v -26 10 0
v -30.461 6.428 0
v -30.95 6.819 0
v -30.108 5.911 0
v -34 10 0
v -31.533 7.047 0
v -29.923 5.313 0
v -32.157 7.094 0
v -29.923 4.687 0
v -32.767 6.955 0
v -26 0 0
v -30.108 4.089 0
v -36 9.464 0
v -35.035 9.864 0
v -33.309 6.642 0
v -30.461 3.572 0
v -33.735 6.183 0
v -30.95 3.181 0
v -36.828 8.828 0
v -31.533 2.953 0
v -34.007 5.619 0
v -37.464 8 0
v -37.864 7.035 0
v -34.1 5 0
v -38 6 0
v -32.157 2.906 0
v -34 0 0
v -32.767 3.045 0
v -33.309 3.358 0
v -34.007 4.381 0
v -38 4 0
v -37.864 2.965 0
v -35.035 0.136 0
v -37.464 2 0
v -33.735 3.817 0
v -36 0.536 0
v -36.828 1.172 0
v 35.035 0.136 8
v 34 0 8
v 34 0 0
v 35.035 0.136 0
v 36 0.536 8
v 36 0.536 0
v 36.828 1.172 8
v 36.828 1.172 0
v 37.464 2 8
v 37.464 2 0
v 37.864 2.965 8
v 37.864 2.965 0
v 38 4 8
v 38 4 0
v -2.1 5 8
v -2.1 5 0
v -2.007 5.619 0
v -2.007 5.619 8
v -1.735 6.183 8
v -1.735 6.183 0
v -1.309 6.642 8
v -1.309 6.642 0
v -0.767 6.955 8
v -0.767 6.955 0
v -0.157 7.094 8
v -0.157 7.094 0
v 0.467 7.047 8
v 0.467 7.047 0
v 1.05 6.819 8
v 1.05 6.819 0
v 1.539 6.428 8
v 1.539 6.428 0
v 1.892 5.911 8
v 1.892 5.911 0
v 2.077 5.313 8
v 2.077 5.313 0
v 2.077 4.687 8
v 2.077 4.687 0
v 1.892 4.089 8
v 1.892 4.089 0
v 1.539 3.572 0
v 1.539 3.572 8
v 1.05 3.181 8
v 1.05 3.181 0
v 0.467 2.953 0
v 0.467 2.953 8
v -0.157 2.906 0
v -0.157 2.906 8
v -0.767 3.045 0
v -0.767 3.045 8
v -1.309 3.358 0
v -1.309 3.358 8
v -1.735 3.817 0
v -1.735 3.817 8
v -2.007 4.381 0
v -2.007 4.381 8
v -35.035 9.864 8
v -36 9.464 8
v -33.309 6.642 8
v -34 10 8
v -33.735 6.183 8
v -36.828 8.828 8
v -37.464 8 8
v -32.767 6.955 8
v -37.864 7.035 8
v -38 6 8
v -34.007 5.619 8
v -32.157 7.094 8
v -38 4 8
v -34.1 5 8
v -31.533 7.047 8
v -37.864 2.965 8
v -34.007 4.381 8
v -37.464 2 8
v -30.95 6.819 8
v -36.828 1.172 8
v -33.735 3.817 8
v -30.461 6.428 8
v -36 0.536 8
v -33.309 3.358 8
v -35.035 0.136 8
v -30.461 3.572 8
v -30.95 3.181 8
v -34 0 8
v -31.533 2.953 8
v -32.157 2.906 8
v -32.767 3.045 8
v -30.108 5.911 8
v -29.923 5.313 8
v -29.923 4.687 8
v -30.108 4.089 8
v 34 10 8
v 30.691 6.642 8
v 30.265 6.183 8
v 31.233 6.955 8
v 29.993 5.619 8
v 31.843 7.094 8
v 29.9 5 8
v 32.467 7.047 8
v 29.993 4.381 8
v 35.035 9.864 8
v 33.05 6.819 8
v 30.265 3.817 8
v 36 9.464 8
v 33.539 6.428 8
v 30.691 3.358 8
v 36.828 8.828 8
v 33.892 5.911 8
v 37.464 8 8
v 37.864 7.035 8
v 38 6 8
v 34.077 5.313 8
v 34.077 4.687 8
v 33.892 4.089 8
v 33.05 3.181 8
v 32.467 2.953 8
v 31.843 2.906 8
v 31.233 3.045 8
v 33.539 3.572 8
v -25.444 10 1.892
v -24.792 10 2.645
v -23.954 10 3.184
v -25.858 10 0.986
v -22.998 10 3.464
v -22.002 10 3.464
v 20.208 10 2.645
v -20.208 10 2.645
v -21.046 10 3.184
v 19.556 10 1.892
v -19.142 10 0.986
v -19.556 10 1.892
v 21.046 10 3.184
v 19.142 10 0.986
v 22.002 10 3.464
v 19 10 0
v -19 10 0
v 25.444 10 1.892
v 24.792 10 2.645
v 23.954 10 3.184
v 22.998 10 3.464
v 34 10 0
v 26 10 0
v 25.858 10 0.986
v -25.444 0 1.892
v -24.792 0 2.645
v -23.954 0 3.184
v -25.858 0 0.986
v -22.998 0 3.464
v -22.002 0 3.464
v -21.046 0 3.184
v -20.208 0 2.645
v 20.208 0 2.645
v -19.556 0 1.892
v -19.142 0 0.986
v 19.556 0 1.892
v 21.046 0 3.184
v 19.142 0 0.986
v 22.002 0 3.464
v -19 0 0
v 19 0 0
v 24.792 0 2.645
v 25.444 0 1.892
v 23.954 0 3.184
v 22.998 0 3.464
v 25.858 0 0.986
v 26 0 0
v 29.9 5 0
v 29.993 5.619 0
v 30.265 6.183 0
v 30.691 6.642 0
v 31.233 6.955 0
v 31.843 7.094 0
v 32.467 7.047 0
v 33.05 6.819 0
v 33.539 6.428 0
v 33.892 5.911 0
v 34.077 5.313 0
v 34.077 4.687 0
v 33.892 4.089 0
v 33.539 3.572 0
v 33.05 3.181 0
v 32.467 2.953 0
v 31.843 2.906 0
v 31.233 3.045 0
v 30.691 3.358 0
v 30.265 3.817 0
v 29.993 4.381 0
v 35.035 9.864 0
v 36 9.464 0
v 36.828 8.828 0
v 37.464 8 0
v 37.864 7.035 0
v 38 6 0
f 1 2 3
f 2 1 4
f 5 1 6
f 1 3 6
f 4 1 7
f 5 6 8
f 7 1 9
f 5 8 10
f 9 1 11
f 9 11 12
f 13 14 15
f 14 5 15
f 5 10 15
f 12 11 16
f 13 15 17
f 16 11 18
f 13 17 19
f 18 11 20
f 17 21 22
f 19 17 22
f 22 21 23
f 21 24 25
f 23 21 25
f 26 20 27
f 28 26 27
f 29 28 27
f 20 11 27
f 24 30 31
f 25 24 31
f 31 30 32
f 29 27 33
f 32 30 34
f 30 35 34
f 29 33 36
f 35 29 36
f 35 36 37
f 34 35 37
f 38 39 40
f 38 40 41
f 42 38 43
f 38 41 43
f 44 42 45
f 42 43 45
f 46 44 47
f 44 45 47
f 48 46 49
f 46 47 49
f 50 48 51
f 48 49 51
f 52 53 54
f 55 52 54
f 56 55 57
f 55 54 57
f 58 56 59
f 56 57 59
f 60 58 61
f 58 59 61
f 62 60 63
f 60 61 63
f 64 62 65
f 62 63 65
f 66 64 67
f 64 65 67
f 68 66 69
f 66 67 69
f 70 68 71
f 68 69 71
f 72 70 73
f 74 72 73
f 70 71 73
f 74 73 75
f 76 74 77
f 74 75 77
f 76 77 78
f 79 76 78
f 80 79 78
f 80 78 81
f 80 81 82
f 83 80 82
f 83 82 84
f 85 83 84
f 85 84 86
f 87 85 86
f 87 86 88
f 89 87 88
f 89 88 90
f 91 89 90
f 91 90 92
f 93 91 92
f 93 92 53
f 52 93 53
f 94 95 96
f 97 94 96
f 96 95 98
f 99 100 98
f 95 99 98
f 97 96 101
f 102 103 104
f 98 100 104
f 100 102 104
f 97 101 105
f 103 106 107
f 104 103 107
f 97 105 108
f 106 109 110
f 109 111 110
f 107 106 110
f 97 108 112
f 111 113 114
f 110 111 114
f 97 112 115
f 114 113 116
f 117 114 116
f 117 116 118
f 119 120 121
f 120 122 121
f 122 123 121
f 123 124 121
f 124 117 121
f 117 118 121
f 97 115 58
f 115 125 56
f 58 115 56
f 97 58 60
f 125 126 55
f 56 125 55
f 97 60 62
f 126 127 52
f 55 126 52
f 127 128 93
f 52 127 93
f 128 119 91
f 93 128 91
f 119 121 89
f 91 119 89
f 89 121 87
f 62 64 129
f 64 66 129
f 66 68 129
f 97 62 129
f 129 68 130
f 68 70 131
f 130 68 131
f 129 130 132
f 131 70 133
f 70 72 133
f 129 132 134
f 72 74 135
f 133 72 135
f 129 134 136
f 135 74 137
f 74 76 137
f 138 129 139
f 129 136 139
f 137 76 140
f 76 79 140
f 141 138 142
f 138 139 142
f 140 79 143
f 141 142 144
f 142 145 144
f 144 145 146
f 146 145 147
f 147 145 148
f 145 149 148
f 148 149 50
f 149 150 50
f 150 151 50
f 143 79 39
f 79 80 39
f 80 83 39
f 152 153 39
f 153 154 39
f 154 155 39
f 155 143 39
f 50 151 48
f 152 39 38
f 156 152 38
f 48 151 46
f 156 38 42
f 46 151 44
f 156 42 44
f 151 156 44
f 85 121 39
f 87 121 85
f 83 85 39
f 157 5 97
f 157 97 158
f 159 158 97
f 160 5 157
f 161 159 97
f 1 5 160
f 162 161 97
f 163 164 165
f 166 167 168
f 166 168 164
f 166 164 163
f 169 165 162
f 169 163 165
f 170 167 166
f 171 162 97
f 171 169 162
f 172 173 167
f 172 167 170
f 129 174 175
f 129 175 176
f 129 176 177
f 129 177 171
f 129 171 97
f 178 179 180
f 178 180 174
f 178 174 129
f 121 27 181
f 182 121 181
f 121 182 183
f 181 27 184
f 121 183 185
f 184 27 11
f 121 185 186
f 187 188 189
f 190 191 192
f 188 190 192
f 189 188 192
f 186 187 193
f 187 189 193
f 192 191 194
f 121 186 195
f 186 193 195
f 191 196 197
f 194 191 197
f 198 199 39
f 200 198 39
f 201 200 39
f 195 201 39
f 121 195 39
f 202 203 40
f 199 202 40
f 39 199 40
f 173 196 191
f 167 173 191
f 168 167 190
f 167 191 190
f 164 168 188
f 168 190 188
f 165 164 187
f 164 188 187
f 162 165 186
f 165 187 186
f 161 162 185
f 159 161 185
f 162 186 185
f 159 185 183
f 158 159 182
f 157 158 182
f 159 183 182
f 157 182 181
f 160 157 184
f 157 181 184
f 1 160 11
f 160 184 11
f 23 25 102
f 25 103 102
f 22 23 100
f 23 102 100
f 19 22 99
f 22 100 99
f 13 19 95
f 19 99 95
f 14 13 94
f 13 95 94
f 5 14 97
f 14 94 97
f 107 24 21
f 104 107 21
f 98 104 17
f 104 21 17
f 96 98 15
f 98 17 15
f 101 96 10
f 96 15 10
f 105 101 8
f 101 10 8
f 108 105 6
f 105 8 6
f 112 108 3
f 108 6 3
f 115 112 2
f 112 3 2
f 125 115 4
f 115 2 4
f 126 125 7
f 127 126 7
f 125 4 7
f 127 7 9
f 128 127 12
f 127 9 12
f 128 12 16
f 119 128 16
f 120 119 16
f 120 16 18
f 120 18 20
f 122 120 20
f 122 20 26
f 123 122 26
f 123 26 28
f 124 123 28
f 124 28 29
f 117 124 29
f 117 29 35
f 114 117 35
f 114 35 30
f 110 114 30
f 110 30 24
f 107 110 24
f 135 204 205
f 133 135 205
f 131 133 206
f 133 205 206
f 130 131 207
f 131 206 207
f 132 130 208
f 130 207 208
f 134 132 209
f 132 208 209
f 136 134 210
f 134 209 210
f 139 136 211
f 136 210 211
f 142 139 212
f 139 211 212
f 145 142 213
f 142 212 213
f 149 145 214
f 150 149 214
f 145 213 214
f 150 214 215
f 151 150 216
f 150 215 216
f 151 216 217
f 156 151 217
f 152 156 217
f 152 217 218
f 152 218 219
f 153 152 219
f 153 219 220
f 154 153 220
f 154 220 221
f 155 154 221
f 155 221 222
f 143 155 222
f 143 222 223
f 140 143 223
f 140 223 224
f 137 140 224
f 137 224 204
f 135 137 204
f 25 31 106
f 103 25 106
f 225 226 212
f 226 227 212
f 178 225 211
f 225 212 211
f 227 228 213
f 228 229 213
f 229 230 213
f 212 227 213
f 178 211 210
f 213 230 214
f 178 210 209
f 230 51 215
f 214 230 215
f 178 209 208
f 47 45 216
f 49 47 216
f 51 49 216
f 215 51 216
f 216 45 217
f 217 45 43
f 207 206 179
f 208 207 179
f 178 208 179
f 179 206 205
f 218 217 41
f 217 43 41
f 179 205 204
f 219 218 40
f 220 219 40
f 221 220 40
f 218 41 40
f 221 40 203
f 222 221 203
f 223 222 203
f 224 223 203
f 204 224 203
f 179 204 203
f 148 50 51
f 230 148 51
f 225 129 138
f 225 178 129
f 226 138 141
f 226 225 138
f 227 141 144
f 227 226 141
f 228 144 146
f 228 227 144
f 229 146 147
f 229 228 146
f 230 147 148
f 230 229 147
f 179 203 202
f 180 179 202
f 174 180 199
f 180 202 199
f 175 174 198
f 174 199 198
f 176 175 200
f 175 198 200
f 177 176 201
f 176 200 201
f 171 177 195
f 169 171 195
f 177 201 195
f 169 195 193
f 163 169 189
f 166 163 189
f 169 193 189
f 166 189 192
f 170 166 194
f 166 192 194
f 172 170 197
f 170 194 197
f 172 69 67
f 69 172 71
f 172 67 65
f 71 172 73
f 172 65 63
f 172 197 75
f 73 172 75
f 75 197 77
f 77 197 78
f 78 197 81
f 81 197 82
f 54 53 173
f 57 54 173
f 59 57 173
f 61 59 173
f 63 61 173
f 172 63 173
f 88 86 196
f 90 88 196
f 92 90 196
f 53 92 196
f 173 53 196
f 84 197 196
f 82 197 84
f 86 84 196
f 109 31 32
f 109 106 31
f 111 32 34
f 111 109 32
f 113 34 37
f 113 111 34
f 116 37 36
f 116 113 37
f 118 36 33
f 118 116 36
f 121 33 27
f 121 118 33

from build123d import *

# Parameters (mm, degrees)
BOSS_EXTRUDE1_DEPTH = 10
SKETCH2_R           = 2.1
CUT_EXTRUDE1_DEPTH  = 9
FILLET1_R           = 4


with BuildPart() as part:
    # Sketch1 → Boss-Extrude1 (new body)
    with BuildSketch(Plane(origin=(0, 0, 0), x_dir=(1, 0, 0), z_dir=(0, 1, 0))):
        with BuildLine():
            Line((-38, -8), (38, -8))
            Line((38, -8), (38, 0))
            Line((38, 0), (26, 0))
            ThreePointArc((26, 0), (22.5, -3.5), (19, 0))
            Line((19, 0), (-19, 0))
            ThreePointArc((-19, 0), (-22.5, -3.5), (-26, 0))
            Line((-26, 0), (-38, 0))
            Line((-38, 0), (-38, -8))
        make_face()
    extrude(amount=BOSS_EXTRUDE1_DEPTH)

    # Sketch2 → Cut-Extrude1 (cut, through all)
    with BuildSketch(Plane(origin=(0, 0, 0), x_dir=(-1, 0, 0), z_dir=(0, 0, -1))):
        with Locations((32, 5)):
            Circle(SKETCH2_R)
        with Locations((-32, 5)):
            Circle(SKETCH2_R)
        with Locations((0, 5)):
            Circle(SKETCH2_R)
    extrude(amount=-CUT_EXTRUDE1_DEPTH, mode=Mode.SUBTRACT)

    # Fillet1
    fillet1_edges = [part.edges().sort_by_distance(p)[0] for p in [
        (38, 0, 4),
        (-38, 0, 4),
        (38, 10, 4),
        (-38, 10, 4),
    ]]
    fillet(fillet1_edges, radius=FILLET1_R)


solid = part.part
